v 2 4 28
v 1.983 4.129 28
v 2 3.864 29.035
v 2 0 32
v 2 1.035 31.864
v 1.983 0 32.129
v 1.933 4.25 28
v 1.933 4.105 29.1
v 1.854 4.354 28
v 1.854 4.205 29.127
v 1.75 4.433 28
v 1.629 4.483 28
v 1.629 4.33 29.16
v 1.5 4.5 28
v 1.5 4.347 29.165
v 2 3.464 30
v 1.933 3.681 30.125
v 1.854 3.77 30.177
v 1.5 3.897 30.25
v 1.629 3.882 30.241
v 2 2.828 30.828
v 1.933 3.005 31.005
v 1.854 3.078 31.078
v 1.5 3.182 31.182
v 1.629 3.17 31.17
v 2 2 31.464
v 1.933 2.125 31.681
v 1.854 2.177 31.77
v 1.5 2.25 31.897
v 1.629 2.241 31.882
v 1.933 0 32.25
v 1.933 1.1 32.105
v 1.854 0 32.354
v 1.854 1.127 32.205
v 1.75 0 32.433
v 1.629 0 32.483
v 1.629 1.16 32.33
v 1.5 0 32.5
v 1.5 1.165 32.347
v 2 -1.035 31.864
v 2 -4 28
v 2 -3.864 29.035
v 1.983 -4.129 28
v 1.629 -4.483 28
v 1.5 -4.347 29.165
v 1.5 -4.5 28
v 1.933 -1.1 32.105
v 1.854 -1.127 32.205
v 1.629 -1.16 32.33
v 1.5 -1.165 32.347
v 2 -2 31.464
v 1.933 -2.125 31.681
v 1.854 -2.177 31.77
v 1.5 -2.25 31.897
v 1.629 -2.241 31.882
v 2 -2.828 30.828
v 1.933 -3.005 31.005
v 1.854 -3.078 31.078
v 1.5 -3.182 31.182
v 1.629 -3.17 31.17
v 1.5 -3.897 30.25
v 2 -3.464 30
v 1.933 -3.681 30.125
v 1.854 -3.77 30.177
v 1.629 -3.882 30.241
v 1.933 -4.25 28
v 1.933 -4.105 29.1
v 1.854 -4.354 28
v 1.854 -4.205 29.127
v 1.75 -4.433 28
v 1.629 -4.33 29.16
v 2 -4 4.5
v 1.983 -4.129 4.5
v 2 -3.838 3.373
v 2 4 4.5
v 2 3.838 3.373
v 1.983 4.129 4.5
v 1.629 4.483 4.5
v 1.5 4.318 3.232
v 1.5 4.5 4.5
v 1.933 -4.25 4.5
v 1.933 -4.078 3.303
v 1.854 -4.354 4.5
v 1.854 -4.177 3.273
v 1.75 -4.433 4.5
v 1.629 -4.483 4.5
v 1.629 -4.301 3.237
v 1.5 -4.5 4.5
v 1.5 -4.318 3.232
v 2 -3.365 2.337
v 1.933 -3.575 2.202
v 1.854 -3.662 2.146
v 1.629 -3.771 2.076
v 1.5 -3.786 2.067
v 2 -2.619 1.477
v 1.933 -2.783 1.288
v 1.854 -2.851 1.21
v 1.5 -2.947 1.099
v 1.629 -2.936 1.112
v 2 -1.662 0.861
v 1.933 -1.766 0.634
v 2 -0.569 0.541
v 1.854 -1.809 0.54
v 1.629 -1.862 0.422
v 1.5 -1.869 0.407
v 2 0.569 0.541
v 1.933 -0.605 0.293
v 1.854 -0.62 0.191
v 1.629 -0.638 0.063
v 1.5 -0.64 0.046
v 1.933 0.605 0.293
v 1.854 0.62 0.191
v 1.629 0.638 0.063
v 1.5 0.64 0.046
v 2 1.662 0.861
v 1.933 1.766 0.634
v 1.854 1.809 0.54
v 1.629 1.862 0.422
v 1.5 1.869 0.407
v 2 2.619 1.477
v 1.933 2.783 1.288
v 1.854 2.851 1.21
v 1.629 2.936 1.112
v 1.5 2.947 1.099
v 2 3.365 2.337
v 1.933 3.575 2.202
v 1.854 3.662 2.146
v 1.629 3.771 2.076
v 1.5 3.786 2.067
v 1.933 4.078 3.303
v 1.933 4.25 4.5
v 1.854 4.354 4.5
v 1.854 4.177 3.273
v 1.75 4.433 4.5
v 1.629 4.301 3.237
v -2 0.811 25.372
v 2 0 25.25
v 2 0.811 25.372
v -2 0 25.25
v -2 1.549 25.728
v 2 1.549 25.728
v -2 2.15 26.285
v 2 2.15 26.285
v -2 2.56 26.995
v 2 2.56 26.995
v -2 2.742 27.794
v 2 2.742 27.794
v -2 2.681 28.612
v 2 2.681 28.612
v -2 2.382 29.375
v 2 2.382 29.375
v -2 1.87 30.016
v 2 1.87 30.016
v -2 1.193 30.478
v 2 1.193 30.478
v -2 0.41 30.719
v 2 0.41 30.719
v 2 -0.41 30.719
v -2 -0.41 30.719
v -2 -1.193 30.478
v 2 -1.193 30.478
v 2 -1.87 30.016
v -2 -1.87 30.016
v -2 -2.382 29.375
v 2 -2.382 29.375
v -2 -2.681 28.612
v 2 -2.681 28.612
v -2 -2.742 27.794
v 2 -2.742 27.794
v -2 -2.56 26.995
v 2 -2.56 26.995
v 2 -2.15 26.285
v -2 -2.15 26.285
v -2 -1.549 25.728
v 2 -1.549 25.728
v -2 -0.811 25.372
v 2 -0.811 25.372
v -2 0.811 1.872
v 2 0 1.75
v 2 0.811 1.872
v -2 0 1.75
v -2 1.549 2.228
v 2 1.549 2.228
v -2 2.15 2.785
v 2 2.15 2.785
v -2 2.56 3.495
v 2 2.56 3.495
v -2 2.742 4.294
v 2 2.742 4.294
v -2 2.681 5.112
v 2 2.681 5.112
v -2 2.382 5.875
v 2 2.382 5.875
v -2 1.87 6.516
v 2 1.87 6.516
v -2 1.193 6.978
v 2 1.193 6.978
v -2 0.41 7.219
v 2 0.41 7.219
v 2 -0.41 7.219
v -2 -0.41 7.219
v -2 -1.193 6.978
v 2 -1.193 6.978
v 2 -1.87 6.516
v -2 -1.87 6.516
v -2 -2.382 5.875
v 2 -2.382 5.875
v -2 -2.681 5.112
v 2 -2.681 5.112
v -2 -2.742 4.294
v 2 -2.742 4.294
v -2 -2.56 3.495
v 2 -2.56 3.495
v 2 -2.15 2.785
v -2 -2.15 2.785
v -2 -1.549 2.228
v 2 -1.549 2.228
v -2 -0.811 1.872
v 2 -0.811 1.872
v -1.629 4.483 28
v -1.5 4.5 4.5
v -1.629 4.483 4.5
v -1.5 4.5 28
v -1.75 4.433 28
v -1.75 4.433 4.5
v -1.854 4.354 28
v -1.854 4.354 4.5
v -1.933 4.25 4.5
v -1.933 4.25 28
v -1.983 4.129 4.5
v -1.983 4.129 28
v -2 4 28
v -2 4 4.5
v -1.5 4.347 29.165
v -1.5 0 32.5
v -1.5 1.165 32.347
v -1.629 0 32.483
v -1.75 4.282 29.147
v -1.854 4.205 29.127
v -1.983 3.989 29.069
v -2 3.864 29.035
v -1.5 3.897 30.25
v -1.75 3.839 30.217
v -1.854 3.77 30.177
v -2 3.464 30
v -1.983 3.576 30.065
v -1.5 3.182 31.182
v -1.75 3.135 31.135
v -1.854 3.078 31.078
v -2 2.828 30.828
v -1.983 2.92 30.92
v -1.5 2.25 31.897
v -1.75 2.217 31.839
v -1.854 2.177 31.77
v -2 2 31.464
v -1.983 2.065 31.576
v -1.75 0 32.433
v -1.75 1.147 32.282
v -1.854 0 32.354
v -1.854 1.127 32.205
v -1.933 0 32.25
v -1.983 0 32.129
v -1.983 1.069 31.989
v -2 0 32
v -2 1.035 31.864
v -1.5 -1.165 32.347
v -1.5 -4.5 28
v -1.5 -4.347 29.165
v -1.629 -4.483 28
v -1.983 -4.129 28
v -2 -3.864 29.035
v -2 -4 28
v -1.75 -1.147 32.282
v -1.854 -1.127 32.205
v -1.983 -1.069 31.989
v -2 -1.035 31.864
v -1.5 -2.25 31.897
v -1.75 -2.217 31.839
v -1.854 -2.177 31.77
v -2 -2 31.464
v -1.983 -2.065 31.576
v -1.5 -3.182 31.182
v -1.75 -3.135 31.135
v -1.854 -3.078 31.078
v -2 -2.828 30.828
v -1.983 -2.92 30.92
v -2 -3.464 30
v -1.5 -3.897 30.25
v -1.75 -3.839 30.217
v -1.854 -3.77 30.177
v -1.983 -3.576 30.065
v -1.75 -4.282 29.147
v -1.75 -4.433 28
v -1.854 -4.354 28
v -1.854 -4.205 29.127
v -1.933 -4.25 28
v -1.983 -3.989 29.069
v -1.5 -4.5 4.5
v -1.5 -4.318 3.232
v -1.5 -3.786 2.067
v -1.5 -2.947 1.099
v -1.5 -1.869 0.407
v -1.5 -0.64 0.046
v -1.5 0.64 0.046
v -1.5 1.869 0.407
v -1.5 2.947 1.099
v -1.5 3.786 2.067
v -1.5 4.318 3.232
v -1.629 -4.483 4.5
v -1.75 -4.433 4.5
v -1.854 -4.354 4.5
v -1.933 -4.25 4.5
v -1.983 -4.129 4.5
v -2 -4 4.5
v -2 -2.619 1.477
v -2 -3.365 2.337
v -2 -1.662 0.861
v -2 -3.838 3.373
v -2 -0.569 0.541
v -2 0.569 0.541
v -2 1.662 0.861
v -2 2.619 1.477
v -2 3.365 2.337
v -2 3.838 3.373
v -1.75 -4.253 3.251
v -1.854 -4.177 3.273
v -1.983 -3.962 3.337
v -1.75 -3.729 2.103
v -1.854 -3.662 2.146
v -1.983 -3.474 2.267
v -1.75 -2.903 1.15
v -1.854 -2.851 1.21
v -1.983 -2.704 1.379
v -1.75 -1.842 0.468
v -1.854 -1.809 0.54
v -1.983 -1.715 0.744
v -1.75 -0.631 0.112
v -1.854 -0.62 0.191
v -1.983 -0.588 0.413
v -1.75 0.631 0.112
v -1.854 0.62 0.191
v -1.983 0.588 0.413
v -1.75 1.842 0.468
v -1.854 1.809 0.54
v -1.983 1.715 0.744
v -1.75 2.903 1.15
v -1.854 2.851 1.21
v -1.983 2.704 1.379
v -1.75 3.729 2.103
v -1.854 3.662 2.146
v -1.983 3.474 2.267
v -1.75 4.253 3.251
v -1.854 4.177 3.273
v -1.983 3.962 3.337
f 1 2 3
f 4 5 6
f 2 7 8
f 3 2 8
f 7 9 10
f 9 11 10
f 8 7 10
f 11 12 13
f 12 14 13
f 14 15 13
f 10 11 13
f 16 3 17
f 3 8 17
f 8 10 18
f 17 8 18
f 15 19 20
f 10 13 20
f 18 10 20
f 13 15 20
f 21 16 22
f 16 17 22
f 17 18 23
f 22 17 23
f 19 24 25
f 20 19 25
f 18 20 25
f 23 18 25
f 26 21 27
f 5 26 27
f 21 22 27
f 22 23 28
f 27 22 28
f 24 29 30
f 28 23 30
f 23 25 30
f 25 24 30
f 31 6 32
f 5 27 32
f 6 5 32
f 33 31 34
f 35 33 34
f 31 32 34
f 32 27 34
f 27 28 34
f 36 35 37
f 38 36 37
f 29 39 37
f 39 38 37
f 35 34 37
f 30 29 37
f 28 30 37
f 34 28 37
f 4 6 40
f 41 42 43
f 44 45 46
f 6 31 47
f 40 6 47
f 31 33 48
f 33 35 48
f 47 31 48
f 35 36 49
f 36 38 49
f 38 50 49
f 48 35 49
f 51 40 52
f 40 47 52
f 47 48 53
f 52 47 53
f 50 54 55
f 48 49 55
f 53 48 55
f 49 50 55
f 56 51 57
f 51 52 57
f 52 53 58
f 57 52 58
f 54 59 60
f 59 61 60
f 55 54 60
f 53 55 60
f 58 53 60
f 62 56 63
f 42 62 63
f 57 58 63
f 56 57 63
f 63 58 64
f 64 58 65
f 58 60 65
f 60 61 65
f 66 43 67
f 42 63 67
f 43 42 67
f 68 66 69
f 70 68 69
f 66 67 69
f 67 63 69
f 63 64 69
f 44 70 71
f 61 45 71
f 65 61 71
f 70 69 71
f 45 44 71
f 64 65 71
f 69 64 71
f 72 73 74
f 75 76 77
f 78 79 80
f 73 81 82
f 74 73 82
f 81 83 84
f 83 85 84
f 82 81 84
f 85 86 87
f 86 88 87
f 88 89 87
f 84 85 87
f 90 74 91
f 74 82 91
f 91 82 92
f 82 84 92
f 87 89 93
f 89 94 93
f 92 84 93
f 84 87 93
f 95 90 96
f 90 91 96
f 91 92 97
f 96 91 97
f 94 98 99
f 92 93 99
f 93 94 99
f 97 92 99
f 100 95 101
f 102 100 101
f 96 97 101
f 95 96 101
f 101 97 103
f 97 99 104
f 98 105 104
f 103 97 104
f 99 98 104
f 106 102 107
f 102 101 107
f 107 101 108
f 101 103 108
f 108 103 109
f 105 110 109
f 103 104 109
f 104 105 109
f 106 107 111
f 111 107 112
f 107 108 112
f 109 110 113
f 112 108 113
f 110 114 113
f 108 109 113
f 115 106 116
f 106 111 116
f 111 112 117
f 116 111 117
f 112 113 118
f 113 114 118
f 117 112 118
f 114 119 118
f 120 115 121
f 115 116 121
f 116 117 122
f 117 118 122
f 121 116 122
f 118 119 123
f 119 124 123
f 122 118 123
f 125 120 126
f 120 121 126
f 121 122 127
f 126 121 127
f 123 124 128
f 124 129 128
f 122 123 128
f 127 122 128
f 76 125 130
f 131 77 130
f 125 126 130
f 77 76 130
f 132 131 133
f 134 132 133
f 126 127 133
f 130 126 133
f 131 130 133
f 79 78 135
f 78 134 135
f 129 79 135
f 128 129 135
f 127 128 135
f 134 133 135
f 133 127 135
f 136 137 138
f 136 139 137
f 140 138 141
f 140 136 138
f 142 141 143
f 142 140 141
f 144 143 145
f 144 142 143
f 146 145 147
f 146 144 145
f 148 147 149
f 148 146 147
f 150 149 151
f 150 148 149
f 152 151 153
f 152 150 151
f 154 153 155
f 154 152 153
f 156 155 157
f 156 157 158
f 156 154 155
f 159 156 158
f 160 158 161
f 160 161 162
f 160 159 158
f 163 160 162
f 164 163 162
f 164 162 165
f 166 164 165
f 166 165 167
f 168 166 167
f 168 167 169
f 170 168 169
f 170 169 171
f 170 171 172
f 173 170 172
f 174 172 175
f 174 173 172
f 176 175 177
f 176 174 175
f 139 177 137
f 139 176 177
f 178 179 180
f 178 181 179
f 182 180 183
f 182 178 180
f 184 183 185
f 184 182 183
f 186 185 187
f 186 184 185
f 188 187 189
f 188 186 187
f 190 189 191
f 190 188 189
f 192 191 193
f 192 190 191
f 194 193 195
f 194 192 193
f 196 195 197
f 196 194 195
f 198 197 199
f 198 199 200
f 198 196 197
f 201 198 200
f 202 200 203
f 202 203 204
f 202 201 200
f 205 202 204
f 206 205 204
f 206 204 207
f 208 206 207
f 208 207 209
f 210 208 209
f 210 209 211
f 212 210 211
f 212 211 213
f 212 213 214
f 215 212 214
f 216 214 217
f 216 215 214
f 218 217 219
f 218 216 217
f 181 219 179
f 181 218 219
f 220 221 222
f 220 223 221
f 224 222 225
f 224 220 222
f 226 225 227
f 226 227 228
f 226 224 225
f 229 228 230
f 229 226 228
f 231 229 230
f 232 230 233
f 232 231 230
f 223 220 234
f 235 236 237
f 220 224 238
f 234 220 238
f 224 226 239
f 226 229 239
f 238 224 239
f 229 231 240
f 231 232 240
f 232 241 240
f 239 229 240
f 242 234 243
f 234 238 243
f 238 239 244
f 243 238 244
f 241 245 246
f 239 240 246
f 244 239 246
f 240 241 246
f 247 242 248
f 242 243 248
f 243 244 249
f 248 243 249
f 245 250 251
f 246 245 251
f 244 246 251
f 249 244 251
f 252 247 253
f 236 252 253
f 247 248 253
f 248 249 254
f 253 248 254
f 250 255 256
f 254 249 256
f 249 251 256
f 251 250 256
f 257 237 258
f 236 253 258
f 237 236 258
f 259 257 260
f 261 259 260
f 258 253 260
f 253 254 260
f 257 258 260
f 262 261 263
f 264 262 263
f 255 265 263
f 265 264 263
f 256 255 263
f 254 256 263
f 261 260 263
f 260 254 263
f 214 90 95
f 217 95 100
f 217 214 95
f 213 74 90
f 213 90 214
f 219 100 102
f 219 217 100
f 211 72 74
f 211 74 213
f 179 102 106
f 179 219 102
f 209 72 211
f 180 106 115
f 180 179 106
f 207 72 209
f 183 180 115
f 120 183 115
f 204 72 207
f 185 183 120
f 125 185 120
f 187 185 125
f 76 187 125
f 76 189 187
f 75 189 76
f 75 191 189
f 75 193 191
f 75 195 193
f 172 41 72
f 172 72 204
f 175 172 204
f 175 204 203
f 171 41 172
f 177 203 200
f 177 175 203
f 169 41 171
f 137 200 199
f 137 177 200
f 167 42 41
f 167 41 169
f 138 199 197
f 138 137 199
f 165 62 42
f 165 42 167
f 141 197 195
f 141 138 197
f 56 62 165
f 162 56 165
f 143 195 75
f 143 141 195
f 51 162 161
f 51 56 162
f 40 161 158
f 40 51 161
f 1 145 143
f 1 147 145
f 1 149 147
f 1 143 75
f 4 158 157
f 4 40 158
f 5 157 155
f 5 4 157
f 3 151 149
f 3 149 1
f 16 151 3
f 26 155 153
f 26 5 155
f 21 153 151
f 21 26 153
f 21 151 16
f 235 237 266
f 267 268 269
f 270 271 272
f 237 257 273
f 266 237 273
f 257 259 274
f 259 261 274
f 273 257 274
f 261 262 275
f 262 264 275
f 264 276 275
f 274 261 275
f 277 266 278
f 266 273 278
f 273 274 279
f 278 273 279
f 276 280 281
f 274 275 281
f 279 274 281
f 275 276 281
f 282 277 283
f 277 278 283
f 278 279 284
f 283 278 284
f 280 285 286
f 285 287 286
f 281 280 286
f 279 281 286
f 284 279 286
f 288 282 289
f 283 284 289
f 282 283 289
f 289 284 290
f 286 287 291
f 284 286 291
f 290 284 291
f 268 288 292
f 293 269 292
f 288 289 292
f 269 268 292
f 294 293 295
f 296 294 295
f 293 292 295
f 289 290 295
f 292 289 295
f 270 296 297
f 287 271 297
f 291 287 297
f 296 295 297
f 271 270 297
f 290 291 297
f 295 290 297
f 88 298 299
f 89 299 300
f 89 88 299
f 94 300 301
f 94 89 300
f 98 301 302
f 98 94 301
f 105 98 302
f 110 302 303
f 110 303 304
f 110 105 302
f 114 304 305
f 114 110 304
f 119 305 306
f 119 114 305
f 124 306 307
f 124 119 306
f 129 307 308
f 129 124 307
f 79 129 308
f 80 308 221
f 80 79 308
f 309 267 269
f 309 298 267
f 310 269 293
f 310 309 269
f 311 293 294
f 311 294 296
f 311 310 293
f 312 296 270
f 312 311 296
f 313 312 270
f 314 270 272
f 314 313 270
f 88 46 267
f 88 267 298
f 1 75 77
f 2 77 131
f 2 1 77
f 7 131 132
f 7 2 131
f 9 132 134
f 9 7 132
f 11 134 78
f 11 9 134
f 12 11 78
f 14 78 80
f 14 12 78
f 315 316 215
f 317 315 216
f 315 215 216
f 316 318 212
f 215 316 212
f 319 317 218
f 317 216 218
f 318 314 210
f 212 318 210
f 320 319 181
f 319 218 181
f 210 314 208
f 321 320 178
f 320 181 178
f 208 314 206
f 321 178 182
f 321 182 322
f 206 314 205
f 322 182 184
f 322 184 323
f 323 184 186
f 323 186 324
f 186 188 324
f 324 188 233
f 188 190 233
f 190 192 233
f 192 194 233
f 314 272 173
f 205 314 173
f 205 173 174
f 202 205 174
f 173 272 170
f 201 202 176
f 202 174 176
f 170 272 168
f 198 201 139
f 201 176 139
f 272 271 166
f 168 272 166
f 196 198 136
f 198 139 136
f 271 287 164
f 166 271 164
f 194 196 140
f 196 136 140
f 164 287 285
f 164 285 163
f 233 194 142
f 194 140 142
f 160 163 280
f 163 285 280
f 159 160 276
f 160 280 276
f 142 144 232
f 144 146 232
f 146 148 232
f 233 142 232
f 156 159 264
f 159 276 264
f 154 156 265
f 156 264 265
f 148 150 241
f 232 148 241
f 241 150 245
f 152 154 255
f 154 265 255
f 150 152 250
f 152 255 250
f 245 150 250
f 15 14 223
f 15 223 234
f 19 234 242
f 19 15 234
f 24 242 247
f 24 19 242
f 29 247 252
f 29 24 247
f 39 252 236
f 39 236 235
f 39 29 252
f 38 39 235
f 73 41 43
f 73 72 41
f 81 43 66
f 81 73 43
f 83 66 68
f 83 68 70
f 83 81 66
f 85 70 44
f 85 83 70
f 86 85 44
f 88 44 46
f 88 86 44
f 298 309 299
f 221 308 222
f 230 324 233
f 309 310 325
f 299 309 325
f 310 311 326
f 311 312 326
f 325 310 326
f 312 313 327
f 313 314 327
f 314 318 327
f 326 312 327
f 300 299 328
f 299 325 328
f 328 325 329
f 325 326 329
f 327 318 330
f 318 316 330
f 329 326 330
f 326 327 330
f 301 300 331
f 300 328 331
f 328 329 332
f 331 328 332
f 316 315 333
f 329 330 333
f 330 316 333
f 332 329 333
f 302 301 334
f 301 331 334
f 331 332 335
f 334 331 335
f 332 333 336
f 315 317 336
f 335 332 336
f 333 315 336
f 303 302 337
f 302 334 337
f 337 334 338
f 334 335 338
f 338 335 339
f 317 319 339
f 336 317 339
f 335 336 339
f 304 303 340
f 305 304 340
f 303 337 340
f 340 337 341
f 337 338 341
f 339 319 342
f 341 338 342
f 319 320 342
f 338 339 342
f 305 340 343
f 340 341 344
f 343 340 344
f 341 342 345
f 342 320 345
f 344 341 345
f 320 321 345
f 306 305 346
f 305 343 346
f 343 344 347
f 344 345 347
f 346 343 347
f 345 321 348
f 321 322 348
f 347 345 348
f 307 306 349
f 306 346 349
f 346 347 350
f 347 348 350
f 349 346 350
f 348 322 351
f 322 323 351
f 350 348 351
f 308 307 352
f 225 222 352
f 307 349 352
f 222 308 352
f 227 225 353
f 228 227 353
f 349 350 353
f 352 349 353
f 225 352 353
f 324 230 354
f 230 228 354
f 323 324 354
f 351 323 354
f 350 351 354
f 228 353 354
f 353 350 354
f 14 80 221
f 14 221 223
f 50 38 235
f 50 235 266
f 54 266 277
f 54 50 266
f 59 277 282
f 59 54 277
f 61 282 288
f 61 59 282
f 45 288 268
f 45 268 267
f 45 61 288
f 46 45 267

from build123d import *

# Parameters (mm, degrees)
CROQUIS1_R              = 2.75
SALIENTE_EXTRUIR4_DEPTH = 2
REDONDEO1_R             = 0.5


with BuildPart() as part:
    # Croquis1 → Saliente-Extruir4 (new, symmetric)
    with BuildSketch(Plane.YZ):
        with BuildLine():
            ThreePointArc((0, 32.5), (-3.181980515, 31.181980515), (-4.5, 28))
            Line((-4.5, 28), (-4.5, 15))
            Line((-4.5, 15), (-4.5, 9))
            Line((-4.5, 9), (-4.5, 4.5))
            ThreePointArc((-4.5, 4.5), (-3.181980515, 1.318019485), (0, 0))
            ThreePointArc((0, 0), (3.181980515, 1.318019485), (4.5, 4.5))
            Line((4.5, 4.5), (4.5, 9))
            Line((4.5, 9), (4.5, 15))
            Line((4.5, 15), (4.5, 28))
            ThreePointArc((4.5, 28), (3.181980515, 31.181980515), (0, 32.5))
        make_face()
        with Locations(Location((0, 4.5, 0), (0, 0, 270))):
            Circle(CROQUIS1_R, mode=Mode.SUBTRACT)
        with Locations(Location((0, 28, 0), (0, 0, 270))):
            Circle(CROQUIS1_R, mode=Mode.SUBTRACT)
    extrude(amount=SALIENTE_EXTRUIR4_DEPTH, both=True)

    # Redondeo1
    redondeo1_edges = [part.edges().sort_by_distance(p)[0] for p in [
        (-2, -4.5, 16.25),
        (2, -4.5, 16.25),
        (2, 0, 0),
        (2, 4.5, 16.25),
        (2, 0, 32.5),
        (-2, 0, 32.5),
        (-2, 4.5, 16.25),
        (-2, 0, 0),
    ]]
    fillet(redondeo1_edges, radius=REDONDEO1_R)


solid = part.part
